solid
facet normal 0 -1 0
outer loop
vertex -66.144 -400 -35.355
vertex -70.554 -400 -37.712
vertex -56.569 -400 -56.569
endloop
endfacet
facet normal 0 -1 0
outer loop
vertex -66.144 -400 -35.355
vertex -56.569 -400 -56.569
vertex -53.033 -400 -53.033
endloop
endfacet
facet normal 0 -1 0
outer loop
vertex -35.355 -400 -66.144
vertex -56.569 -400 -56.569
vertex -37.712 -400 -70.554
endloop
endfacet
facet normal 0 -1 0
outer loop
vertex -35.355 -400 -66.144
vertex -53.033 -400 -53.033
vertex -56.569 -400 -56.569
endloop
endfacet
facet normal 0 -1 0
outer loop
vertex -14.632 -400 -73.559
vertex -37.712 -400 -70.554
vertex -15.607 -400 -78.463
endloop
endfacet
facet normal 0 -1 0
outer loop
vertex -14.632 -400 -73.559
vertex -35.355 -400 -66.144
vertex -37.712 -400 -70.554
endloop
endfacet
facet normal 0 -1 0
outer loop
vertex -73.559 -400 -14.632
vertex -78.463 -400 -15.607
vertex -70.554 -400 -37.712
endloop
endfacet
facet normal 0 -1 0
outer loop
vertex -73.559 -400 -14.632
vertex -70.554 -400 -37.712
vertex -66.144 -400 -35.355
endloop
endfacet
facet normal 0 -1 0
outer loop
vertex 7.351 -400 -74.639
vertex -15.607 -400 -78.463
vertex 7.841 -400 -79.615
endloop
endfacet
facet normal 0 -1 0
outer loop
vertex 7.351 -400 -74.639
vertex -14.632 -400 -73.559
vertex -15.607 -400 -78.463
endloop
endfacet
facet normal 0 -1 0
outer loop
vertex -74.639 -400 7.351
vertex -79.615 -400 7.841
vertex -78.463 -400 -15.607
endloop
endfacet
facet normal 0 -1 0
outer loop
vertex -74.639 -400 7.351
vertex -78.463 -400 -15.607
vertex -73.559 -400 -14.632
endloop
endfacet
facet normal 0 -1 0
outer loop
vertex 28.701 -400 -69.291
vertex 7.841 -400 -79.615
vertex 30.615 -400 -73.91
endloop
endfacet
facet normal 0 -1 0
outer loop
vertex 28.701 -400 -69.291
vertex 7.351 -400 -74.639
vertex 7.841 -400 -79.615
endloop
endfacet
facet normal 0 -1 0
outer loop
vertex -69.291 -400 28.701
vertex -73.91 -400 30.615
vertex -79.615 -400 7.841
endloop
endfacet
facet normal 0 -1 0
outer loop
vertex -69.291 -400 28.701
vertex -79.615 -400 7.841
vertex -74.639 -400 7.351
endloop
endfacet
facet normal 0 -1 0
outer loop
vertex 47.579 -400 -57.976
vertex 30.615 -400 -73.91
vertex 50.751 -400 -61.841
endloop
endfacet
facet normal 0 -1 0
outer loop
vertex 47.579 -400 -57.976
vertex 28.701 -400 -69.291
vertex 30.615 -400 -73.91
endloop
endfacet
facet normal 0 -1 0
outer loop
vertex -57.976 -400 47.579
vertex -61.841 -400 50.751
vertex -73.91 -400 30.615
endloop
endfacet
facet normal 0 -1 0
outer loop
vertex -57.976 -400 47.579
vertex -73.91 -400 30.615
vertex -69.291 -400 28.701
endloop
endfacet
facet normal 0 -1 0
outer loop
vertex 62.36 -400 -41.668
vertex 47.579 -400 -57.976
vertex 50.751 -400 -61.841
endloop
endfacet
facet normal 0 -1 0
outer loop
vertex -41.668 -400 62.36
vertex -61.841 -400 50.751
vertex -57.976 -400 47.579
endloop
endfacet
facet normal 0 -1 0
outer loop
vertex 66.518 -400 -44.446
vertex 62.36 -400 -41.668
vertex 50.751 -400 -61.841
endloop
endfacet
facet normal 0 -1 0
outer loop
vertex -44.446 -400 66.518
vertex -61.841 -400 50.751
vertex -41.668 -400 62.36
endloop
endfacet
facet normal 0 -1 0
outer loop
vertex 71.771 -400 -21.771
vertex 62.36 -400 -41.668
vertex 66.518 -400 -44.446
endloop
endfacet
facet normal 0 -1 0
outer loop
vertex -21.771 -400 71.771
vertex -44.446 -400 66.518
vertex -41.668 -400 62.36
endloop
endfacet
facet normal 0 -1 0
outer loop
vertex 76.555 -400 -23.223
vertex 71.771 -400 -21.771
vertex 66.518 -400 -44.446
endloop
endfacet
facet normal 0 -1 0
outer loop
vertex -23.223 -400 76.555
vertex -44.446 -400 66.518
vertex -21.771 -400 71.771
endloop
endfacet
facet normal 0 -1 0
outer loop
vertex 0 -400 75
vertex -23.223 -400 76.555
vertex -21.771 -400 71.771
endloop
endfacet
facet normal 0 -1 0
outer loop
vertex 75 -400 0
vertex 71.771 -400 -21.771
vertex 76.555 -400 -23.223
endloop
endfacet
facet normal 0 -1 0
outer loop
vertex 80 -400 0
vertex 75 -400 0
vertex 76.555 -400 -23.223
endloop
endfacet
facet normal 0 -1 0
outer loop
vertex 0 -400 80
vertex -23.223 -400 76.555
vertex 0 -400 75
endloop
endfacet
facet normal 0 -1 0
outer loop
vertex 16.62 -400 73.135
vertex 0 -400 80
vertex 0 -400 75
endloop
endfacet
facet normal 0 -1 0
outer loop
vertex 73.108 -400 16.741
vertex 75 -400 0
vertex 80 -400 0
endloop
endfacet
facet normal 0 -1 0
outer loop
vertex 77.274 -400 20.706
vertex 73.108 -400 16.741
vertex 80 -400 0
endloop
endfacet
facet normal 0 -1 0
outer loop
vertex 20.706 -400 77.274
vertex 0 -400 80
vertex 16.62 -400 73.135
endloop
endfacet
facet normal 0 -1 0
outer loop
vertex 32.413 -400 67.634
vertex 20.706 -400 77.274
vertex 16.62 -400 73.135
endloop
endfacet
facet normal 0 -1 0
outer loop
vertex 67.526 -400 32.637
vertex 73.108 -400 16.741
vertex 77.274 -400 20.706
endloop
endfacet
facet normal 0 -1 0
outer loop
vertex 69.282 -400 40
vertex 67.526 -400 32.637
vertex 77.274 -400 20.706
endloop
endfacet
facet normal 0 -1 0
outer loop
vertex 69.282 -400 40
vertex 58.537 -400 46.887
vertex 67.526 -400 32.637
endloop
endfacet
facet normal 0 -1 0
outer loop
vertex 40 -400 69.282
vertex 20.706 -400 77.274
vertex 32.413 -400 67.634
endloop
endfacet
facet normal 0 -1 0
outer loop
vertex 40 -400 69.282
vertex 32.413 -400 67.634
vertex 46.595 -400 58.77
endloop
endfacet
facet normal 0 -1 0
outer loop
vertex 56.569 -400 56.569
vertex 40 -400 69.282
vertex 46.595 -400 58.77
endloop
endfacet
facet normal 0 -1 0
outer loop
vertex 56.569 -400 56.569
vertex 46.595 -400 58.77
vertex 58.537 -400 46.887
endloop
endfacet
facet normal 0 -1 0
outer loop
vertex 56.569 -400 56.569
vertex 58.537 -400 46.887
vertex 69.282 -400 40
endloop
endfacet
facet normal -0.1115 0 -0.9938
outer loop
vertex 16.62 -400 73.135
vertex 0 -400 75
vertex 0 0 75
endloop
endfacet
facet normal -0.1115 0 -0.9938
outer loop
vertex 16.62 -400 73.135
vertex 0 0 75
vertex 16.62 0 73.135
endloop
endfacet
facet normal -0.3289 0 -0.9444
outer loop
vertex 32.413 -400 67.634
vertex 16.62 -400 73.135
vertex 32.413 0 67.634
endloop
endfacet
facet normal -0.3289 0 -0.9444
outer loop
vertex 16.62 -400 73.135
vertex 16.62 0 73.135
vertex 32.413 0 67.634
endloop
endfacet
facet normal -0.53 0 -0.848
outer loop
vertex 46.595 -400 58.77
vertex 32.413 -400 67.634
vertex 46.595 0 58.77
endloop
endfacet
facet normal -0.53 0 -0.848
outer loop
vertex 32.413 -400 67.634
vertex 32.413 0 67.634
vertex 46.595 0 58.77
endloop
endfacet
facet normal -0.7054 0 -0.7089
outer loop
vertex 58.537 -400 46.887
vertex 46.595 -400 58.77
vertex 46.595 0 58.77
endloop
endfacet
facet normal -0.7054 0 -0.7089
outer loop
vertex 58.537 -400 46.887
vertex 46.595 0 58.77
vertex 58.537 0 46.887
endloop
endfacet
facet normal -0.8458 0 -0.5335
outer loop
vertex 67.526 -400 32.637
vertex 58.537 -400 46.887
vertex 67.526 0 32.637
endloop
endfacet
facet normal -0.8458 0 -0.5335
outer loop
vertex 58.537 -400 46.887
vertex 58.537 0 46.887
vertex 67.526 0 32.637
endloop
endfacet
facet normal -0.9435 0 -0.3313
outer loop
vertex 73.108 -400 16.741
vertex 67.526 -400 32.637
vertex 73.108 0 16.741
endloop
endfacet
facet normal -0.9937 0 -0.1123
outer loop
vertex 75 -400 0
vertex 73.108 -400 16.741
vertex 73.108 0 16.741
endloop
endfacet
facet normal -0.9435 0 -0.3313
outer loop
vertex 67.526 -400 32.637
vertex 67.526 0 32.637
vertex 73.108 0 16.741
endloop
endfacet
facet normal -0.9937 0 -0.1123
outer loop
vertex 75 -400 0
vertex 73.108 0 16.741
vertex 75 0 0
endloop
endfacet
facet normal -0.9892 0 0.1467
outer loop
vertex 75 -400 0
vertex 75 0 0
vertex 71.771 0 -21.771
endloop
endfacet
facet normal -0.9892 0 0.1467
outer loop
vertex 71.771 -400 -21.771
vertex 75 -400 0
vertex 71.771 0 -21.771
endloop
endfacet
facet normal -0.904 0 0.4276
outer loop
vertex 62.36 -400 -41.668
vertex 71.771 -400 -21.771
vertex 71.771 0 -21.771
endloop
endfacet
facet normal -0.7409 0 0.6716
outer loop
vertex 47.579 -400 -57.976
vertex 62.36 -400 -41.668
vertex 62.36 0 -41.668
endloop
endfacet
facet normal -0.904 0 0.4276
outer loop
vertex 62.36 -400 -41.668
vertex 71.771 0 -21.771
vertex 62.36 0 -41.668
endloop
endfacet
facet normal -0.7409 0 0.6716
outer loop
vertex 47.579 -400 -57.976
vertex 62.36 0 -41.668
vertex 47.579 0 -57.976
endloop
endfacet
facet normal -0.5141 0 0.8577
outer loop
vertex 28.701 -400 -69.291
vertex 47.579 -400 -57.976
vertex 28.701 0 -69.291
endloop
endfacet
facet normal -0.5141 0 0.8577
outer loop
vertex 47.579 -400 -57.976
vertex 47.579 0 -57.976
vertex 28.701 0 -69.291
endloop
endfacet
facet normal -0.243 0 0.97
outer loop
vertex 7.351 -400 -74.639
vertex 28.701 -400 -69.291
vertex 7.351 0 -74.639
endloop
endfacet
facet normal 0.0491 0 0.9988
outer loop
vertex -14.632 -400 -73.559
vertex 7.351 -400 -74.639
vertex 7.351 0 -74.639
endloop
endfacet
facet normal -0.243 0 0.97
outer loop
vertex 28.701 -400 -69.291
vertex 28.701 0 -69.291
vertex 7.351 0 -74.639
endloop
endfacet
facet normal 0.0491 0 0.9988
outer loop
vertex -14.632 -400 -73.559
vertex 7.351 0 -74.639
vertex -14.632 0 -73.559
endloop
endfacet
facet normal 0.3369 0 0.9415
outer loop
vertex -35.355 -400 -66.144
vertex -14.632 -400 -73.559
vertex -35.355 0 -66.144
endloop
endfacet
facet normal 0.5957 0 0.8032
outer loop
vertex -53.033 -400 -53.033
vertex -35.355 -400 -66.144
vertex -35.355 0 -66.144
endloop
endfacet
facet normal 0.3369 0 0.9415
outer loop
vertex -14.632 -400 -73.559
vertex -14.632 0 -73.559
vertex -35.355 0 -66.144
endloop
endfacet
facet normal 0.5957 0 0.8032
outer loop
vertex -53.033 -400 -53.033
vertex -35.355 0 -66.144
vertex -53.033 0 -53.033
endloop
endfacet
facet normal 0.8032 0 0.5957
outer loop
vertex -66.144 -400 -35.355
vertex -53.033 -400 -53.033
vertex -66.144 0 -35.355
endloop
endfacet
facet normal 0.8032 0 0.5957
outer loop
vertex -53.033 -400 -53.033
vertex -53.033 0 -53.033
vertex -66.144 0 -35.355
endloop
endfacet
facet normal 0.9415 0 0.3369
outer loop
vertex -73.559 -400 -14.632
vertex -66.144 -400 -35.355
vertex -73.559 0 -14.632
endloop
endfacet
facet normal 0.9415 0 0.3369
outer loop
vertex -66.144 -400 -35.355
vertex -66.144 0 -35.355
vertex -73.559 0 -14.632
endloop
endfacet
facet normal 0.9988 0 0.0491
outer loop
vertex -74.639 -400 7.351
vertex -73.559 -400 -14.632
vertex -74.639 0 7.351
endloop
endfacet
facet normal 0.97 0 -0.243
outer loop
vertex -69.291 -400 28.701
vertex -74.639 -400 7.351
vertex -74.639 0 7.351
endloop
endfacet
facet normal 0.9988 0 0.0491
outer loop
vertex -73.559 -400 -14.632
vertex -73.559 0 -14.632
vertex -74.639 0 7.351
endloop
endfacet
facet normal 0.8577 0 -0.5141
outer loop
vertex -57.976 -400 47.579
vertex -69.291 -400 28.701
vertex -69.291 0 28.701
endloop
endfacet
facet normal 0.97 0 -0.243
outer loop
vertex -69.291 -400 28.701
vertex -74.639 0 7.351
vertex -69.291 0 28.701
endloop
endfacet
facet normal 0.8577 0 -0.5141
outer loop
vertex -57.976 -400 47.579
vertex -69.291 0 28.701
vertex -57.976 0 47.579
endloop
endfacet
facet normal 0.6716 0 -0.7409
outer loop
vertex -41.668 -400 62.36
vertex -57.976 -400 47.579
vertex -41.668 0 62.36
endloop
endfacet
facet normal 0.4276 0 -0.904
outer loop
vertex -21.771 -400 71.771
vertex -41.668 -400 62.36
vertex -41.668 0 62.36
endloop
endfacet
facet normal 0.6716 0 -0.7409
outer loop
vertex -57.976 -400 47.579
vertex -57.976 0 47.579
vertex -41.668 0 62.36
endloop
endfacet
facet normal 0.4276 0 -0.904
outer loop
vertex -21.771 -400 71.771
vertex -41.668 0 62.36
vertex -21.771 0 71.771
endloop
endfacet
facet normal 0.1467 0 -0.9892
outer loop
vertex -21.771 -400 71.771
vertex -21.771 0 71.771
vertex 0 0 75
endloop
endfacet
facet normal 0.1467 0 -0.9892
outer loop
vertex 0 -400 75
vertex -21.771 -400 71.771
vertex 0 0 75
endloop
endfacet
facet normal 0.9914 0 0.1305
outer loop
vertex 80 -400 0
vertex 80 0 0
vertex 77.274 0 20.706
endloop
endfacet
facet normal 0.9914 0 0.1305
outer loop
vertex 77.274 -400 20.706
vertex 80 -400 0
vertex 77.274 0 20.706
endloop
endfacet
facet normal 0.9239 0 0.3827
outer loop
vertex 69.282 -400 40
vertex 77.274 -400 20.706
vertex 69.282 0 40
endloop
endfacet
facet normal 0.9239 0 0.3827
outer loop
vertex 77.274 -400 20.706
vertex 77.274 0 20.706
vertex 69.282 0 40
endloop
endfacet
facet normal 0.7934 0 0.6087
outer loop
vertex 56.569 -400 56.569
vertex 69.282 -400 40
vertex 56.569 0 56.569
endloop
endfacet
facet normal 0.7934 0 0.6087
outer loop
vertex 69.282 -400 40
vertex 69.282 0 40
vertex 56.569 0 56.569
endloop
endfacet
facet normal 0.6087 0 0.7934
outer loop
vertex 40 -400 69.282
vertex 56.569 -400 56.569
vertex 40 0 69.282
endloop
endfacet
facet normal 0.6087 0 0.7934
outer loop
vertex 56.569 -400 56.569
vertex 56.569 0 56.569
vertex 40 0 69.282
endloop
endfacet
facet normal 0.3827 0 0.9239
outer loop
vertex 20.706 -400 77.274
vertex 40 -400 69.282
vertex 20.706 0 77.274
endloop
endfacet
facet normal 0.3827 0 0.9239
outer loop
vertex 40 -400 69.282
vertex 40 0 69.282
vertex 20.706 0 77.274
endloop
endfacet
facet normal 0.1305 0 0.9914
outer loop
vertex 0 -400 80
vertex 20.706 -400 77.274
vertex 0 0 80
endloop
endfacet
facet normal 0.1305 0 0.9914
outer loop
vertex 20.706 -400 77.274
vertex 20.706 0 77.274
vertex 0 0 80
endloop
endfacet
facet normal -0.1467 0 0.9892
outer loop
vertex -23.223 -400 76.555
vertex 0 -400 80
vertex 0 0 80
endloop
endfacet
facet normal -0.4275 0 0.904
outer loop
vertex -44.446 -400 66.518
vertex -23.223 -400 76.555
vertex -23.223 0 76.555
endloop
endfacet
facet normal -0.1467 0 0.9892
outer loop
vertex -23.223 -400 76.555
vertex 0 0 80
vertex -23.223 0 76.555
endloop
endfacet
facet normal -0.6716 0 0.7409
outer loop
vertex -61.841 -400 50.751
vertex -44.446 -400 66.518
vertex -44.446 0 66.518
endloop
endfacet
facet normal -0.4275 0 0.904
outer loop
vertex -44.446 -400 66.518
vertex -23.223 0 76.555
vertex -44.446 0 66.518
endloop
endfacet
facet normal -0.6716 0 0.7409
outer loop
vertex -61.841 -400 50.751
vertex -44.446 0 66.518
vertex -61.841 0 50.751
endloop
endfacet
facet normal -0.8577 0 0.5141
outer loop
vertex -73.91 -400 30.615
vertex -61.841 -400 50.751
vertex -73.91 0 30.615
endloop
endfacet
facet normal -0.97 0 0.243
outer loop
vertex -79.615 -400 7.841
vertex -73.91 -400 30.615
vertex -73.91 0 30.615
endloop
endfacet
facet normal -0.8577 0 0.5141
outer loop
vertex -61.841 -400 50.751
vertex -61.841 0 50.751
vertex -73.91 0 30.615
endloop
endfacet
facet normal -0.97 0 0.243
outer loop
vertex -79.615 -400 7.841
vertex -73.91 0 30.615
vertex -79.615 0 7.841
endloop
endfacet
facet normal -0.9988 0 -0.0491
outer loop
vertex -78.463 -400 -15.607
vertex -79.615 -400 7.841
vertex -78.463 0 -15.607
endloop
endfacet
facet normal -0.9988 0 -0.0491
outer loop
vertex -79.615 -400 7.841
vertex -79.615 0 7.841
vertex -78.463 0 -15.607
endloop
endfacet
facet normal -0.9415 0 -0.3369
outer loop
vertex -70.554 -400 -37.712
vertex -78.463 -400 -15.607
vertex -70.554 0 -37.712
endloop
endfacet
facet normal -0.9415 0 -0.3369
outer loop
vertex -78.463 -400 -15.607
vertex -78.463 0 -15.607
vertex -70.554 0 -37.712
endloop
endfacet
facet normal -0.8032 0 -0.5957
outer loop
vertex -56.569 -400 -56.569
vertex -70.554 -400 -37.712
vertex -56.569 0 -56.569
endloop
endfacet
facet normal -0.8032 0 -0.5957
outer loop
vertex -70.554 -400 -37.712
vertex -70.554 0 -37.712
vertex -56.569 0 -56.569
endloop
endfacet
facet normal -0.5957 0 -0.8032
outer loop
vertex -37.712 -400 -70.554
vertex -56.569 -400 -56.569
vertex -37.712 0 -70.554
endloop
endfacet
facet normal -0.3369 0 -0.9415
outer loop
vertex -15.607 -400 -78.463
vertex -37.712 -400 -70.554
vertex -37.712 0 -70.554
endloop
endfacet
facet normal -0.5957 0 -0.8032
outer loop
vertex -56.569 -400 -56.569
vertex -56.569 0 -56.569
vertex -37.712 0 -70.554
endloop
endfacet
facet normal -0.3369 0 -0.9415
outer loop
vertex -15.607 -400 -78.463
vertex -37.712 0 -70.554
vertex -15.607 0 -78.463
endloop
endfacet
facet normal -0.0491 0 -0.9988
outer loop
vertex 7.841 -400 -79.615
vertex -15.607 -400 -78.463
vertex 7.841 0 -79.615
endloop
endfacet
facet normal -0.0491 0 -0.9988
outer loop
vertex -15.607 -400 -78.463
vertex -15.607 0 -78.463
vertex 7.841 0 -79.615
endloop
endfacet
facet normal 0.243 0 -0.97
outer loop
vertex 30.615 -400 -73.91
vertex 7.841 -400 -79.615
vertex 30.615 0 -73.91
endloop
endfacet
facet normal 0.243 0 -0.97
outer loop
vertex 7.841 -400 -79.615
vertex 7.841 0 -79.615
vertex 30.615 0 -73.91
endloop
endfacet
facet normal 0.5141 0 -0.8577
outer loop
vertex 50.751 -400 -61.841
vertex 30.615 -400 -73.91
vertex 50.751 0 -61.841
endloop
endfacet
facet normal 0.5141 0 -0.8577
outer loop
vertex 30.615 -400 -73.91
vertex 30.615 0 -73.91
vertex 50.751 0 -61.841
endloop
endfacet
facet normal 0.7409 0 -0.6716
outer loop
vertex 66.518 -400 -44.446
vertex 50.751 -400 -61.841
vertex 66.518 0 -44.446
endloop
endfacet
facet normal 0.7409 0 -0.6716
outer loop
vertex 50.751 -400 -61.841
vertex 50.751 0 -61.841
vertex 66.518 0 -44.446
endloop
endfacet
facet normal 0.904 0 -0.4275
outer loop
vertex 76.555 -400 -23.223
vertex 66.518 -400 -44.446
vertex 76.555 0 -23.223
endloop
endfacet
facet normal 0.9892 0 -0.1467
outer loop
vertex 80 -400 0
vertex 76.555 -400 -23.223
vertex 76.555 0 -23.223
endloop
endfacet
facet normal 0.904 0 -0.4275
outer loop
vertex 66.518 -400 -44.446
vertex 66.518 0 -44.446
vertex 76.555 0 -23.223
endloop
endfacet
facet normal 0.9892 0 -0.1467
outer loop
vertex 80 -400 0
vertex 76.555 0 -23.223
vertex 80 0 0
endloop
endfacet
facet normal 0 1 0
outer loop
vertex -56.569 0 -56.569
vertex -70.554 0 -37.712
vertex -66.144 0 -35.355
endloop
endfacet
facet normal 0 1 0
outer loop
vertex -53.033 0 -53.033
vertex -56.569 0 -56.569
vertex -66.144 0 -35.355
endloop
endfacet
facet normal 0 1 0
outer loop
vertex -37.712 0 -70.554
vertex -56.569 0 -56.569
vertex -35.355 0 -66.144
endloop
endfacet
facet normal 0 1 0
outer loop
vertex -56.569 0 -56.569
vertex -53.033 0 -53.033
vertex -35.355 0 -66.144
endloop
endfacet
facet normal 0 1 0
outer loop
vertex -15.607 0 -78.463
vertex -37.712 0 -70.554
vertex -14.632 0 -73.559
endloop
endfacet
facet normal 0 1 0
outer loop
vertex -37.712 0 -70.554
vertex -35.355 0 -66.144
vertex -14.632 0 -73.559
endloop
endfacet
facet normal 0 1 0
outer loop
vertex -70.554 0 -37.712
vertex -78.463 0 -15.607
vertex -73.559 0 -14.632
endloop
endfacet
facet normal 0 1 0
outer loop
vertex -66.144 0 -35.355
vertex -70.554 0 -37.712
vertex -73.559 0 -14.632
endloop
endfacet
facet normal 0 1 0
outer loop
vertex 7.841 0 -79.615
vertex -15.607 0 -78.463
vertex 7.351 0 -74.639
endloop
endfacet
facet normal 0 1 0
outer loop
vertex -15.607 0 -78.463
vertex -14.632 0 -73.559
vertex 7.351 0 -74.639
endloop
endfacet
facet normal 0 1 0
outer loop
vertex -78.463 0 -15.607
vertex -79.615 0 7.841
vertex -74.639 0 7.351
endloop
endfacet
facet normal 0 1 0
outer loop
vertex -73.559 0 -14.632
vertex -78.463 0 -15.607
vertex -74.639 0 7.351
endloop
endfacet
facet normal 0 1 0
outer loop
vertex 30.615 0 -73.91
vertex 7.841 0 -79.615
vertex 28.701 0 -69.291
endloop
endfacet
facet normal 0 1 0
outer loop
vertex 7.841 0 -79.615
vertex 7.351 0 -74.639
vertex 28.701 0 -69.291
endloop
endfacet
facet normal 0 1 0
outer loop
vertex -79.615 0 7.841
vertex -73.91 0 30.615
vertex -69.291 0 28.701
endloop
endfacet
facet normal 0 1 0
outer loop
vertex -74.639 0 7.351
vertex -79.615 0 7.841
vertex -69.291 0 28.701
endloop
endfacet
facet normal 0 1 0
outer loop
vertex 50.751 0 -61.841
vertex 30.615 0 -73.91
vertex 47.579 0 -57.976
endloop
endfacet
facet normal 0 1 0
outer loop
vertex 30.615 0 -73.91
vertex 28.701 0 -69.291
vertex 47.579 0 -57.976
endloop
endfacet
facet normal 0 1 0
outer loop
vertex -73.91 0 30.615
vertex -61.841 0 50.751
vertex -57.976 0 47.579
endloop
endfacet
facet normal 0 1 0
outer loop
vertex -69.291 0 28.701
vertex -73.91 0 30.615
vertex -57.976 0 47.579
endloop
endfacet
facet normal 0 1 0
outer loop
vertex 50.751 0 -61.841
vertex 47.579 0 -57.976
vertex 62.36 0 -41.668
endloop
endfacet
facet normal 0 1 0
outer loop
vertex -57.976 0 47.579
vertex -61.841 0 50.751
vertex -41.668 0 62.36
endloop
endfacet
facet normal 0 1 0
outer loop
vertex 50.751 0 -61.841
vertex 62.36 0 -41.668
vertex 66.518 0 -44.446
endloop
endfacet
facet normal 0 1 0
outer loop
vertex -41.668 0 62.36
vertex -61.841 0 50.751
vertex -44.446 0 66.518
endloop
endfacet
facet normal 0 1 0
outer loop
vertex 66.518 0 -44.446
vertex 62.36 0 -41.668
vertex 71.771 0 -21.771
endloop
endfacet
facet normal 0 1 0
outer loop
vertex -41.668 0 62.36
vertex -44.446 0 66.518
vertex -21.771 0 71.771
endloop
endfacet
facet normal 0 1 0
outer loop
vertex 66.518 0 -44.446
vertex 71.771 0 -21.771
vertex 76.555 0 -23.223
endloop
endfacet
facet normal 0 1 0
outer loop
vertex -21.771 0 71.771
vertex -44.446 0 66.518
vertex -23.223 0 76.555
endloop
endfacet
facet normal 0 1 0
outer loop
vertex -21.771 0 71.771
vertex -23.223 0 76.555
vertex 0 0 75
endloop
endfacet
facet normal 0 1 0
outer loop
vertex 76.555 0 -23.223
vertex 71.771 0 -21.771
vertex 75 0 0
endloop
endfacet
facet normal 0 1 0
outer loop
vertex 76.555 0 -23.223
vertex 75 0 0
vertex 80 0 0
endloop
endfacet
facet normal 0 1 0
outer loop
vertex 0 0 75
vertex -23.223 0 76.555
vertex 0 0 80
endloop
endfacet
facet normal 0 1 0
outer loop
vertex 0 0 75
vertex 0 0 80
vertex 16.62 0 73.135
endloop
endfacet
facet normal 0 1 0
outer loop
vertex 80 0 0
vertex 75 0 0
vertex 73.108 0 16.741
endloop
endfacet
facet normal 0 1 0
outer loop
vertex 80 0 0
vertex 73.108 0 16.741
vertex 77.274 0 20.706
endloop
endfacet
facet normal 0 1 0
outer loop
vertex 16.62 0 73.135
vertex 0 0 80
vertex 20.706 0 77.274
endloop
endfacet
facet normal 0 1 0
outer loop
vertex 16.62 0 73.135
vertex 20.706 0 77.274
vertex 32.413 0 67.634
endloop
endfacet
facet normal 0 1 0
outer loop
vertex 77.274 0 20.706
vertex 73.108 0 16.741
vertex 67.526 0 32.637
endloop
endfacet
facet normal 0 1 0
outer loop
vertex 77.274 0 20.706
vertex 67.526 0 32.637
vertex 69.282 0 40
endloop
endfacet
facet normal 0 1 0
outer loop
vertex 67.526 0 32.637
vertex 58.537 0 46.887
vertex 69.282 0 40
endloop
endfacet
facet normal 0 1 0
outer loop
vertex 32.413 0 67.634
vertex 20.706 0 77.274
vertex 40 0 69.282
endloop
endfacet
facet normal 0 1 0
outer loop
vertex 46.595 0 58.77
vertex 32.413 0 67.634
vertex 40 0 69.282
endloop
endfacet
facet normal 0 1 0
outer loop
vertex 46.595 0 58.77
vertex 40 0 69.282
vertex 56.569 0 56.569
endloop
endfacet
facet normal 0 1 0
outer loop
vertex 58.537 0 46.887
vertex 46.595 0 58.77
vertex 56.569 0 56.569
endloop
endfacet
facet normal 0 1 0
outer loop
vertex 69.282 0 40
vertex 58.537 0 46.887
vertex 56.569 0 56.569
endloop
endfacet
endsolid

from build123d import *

# Parameters (mm, degrees)
F1_DEPTH = 400


with BuildPart() as f1:
    # F0 (on Front) → F1 (new body)
    with BuildSketch(Plane.XZ):
        with BuildLine():
            ThreePointArc((0, 80), (-56.568542, -56.568542), (80, 0))
            ThreePointArc((80, 0), (56.568542, 56.568542), (0, 80))
        make_face()
        with BuildLine():
            ThreePointArc((75, 0), (-53.033009, -53.033009), (0, 75))
            ThreePointArc((0, 75), (24.670108, 70.826448), (46.594564, 58.770287))
            ThreePointArc((46.594564, 58.770287), (67.526263, 32.637461), (75, 0))
        make_face(mode=Mode.SUBTRACT)
    extrude(amount=F1_DEPTH)


solid = f1.part
